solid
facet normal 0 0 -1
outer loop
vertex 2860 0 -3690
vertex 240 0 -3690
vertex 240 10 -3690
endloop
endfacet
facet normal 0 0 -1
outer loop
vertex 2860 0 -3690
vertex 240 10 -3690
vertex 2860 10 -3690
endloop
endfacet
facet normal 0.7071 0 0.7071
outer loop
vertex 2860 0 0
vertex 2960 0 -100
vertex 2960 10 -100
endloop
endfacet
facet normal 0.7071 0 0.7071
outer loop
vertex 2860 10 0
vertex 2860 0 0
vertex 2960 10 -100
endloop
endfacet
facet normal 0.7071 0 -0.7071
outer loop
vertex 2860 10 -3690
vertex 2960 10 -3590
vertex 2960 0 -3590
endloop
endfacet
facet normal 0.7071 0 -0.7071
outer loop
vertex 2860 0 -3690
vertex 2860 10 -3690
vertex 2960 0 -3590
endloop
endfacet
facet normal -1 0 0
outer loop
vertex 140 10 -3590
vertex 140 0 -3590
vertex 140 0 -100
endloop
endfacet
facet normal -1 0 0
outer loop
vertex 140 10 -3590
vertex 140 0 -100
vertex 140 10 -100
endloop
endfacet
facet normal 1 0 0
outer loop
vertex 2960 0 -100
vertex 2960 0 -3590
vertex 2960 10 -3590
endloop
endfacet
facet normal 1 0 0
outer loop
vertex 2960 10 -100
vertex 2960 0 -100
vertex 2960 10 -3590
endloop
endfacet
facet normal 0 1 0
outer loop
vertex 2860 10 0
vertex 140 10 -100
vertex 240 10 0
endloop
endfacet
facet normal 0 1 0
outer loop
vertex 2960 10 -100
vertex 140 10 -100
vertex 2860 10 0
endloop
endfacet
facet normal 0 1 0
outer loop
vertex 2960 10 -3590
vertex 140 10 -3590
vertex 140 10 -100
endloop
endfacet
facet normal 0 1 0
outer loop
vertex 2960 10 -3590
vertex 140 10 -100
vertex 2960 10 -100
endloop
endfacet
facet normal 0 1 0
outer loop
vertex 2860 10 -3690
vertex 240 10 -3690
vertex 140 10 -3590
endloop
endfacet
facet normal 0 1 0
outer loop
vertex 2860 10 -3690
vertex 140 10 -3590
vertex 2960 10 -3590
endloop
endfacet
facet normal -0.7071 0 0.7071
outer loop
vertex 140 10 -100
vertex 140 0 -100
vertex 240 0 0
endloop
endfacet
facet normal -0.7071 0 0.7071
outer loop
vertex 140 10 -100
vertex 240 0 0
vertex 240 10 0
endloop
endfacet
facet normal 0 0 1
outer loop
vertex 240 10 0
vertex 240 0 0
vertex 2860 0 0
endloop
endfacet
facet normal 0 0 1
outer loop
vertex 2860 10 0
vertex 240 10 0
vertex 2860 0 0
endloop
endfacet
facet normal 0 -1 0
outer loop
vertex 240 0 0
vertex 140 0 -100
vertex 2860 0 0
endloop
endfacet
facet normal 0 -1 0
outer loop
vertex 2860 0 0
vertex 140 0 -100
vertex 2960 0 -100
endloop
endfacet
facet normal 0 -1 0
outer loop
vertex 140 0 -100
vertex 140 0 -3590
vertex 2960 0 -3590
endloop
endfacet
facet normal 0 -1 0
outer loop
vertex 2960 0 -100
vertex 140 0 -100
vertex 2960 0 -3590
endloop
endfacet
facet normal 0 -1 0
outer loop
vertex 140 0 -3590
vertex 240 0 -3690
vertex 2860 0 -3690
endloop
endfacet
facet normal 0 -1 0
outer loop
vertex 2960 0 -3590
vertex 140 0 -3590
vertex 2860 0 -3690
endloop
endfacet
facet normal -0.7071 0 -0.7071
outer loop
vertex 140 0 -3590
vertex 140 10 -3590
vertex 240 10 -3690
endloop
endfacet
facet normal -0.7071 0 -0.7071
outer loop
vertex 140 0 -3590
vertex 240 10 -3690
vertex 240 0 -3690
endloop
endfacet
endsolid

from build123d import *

# Parameters (mm, degrees)
ESQUISSE1_W             = 3100
ESQUISSE1_H             = 3690
BOSS_EXTRU_1_DEPTH      = 10
ESQUISSE2_W             = 140
ESQUISSE2_H             = 10
ENL_V_MAT_EXTRU_1_DEPTH = 3980.6
CHANFREIN1_SIZE         = 100


with BuildPart() as part:
    # Esquisse1 → Boss.-Extru.1 (new body)
    with BuildSketch(Plane(origin=(0, 0, 0), x_dir=(1, 0, 0), z_dir=(0, 1, 0))):
        with Locations((1550, 1845)):
            Rectangle(ESQUISSE1_W, ESQUISSE1_H)
    extrude(amount=BOSS_EXTRU_1_DEPTH)

    # Esquisse2 → Enlèv. mat.-Extru.1 (cut)
    with BuildSketch(Plane.XY):
        with Locations((70, 5)):
            Rectangle(ESQUISSE2_W, ESQUISSE2_H)
        with Locations((3030, 5)):
            Rectangle(ESQUISSE2_W, ESQUISSE2_H)
    extrude(amount=-ENL_V_MAT_EXTRU_1_DEPTH, mode=Mode.SUBTRACT)

    # Chanfrein1
    chanfrein1_edges = [part.edges().sort_by_distance(p)[0] for p in [
        (140, 5, -3690),
        (140, 5, 0),
        (2960, 5, -3690),
        (2960, 5, 0),
    ]]
    chamfer(chanfrein1_edges, length=CHANFREIN1_SIZE)


solid = part.part
